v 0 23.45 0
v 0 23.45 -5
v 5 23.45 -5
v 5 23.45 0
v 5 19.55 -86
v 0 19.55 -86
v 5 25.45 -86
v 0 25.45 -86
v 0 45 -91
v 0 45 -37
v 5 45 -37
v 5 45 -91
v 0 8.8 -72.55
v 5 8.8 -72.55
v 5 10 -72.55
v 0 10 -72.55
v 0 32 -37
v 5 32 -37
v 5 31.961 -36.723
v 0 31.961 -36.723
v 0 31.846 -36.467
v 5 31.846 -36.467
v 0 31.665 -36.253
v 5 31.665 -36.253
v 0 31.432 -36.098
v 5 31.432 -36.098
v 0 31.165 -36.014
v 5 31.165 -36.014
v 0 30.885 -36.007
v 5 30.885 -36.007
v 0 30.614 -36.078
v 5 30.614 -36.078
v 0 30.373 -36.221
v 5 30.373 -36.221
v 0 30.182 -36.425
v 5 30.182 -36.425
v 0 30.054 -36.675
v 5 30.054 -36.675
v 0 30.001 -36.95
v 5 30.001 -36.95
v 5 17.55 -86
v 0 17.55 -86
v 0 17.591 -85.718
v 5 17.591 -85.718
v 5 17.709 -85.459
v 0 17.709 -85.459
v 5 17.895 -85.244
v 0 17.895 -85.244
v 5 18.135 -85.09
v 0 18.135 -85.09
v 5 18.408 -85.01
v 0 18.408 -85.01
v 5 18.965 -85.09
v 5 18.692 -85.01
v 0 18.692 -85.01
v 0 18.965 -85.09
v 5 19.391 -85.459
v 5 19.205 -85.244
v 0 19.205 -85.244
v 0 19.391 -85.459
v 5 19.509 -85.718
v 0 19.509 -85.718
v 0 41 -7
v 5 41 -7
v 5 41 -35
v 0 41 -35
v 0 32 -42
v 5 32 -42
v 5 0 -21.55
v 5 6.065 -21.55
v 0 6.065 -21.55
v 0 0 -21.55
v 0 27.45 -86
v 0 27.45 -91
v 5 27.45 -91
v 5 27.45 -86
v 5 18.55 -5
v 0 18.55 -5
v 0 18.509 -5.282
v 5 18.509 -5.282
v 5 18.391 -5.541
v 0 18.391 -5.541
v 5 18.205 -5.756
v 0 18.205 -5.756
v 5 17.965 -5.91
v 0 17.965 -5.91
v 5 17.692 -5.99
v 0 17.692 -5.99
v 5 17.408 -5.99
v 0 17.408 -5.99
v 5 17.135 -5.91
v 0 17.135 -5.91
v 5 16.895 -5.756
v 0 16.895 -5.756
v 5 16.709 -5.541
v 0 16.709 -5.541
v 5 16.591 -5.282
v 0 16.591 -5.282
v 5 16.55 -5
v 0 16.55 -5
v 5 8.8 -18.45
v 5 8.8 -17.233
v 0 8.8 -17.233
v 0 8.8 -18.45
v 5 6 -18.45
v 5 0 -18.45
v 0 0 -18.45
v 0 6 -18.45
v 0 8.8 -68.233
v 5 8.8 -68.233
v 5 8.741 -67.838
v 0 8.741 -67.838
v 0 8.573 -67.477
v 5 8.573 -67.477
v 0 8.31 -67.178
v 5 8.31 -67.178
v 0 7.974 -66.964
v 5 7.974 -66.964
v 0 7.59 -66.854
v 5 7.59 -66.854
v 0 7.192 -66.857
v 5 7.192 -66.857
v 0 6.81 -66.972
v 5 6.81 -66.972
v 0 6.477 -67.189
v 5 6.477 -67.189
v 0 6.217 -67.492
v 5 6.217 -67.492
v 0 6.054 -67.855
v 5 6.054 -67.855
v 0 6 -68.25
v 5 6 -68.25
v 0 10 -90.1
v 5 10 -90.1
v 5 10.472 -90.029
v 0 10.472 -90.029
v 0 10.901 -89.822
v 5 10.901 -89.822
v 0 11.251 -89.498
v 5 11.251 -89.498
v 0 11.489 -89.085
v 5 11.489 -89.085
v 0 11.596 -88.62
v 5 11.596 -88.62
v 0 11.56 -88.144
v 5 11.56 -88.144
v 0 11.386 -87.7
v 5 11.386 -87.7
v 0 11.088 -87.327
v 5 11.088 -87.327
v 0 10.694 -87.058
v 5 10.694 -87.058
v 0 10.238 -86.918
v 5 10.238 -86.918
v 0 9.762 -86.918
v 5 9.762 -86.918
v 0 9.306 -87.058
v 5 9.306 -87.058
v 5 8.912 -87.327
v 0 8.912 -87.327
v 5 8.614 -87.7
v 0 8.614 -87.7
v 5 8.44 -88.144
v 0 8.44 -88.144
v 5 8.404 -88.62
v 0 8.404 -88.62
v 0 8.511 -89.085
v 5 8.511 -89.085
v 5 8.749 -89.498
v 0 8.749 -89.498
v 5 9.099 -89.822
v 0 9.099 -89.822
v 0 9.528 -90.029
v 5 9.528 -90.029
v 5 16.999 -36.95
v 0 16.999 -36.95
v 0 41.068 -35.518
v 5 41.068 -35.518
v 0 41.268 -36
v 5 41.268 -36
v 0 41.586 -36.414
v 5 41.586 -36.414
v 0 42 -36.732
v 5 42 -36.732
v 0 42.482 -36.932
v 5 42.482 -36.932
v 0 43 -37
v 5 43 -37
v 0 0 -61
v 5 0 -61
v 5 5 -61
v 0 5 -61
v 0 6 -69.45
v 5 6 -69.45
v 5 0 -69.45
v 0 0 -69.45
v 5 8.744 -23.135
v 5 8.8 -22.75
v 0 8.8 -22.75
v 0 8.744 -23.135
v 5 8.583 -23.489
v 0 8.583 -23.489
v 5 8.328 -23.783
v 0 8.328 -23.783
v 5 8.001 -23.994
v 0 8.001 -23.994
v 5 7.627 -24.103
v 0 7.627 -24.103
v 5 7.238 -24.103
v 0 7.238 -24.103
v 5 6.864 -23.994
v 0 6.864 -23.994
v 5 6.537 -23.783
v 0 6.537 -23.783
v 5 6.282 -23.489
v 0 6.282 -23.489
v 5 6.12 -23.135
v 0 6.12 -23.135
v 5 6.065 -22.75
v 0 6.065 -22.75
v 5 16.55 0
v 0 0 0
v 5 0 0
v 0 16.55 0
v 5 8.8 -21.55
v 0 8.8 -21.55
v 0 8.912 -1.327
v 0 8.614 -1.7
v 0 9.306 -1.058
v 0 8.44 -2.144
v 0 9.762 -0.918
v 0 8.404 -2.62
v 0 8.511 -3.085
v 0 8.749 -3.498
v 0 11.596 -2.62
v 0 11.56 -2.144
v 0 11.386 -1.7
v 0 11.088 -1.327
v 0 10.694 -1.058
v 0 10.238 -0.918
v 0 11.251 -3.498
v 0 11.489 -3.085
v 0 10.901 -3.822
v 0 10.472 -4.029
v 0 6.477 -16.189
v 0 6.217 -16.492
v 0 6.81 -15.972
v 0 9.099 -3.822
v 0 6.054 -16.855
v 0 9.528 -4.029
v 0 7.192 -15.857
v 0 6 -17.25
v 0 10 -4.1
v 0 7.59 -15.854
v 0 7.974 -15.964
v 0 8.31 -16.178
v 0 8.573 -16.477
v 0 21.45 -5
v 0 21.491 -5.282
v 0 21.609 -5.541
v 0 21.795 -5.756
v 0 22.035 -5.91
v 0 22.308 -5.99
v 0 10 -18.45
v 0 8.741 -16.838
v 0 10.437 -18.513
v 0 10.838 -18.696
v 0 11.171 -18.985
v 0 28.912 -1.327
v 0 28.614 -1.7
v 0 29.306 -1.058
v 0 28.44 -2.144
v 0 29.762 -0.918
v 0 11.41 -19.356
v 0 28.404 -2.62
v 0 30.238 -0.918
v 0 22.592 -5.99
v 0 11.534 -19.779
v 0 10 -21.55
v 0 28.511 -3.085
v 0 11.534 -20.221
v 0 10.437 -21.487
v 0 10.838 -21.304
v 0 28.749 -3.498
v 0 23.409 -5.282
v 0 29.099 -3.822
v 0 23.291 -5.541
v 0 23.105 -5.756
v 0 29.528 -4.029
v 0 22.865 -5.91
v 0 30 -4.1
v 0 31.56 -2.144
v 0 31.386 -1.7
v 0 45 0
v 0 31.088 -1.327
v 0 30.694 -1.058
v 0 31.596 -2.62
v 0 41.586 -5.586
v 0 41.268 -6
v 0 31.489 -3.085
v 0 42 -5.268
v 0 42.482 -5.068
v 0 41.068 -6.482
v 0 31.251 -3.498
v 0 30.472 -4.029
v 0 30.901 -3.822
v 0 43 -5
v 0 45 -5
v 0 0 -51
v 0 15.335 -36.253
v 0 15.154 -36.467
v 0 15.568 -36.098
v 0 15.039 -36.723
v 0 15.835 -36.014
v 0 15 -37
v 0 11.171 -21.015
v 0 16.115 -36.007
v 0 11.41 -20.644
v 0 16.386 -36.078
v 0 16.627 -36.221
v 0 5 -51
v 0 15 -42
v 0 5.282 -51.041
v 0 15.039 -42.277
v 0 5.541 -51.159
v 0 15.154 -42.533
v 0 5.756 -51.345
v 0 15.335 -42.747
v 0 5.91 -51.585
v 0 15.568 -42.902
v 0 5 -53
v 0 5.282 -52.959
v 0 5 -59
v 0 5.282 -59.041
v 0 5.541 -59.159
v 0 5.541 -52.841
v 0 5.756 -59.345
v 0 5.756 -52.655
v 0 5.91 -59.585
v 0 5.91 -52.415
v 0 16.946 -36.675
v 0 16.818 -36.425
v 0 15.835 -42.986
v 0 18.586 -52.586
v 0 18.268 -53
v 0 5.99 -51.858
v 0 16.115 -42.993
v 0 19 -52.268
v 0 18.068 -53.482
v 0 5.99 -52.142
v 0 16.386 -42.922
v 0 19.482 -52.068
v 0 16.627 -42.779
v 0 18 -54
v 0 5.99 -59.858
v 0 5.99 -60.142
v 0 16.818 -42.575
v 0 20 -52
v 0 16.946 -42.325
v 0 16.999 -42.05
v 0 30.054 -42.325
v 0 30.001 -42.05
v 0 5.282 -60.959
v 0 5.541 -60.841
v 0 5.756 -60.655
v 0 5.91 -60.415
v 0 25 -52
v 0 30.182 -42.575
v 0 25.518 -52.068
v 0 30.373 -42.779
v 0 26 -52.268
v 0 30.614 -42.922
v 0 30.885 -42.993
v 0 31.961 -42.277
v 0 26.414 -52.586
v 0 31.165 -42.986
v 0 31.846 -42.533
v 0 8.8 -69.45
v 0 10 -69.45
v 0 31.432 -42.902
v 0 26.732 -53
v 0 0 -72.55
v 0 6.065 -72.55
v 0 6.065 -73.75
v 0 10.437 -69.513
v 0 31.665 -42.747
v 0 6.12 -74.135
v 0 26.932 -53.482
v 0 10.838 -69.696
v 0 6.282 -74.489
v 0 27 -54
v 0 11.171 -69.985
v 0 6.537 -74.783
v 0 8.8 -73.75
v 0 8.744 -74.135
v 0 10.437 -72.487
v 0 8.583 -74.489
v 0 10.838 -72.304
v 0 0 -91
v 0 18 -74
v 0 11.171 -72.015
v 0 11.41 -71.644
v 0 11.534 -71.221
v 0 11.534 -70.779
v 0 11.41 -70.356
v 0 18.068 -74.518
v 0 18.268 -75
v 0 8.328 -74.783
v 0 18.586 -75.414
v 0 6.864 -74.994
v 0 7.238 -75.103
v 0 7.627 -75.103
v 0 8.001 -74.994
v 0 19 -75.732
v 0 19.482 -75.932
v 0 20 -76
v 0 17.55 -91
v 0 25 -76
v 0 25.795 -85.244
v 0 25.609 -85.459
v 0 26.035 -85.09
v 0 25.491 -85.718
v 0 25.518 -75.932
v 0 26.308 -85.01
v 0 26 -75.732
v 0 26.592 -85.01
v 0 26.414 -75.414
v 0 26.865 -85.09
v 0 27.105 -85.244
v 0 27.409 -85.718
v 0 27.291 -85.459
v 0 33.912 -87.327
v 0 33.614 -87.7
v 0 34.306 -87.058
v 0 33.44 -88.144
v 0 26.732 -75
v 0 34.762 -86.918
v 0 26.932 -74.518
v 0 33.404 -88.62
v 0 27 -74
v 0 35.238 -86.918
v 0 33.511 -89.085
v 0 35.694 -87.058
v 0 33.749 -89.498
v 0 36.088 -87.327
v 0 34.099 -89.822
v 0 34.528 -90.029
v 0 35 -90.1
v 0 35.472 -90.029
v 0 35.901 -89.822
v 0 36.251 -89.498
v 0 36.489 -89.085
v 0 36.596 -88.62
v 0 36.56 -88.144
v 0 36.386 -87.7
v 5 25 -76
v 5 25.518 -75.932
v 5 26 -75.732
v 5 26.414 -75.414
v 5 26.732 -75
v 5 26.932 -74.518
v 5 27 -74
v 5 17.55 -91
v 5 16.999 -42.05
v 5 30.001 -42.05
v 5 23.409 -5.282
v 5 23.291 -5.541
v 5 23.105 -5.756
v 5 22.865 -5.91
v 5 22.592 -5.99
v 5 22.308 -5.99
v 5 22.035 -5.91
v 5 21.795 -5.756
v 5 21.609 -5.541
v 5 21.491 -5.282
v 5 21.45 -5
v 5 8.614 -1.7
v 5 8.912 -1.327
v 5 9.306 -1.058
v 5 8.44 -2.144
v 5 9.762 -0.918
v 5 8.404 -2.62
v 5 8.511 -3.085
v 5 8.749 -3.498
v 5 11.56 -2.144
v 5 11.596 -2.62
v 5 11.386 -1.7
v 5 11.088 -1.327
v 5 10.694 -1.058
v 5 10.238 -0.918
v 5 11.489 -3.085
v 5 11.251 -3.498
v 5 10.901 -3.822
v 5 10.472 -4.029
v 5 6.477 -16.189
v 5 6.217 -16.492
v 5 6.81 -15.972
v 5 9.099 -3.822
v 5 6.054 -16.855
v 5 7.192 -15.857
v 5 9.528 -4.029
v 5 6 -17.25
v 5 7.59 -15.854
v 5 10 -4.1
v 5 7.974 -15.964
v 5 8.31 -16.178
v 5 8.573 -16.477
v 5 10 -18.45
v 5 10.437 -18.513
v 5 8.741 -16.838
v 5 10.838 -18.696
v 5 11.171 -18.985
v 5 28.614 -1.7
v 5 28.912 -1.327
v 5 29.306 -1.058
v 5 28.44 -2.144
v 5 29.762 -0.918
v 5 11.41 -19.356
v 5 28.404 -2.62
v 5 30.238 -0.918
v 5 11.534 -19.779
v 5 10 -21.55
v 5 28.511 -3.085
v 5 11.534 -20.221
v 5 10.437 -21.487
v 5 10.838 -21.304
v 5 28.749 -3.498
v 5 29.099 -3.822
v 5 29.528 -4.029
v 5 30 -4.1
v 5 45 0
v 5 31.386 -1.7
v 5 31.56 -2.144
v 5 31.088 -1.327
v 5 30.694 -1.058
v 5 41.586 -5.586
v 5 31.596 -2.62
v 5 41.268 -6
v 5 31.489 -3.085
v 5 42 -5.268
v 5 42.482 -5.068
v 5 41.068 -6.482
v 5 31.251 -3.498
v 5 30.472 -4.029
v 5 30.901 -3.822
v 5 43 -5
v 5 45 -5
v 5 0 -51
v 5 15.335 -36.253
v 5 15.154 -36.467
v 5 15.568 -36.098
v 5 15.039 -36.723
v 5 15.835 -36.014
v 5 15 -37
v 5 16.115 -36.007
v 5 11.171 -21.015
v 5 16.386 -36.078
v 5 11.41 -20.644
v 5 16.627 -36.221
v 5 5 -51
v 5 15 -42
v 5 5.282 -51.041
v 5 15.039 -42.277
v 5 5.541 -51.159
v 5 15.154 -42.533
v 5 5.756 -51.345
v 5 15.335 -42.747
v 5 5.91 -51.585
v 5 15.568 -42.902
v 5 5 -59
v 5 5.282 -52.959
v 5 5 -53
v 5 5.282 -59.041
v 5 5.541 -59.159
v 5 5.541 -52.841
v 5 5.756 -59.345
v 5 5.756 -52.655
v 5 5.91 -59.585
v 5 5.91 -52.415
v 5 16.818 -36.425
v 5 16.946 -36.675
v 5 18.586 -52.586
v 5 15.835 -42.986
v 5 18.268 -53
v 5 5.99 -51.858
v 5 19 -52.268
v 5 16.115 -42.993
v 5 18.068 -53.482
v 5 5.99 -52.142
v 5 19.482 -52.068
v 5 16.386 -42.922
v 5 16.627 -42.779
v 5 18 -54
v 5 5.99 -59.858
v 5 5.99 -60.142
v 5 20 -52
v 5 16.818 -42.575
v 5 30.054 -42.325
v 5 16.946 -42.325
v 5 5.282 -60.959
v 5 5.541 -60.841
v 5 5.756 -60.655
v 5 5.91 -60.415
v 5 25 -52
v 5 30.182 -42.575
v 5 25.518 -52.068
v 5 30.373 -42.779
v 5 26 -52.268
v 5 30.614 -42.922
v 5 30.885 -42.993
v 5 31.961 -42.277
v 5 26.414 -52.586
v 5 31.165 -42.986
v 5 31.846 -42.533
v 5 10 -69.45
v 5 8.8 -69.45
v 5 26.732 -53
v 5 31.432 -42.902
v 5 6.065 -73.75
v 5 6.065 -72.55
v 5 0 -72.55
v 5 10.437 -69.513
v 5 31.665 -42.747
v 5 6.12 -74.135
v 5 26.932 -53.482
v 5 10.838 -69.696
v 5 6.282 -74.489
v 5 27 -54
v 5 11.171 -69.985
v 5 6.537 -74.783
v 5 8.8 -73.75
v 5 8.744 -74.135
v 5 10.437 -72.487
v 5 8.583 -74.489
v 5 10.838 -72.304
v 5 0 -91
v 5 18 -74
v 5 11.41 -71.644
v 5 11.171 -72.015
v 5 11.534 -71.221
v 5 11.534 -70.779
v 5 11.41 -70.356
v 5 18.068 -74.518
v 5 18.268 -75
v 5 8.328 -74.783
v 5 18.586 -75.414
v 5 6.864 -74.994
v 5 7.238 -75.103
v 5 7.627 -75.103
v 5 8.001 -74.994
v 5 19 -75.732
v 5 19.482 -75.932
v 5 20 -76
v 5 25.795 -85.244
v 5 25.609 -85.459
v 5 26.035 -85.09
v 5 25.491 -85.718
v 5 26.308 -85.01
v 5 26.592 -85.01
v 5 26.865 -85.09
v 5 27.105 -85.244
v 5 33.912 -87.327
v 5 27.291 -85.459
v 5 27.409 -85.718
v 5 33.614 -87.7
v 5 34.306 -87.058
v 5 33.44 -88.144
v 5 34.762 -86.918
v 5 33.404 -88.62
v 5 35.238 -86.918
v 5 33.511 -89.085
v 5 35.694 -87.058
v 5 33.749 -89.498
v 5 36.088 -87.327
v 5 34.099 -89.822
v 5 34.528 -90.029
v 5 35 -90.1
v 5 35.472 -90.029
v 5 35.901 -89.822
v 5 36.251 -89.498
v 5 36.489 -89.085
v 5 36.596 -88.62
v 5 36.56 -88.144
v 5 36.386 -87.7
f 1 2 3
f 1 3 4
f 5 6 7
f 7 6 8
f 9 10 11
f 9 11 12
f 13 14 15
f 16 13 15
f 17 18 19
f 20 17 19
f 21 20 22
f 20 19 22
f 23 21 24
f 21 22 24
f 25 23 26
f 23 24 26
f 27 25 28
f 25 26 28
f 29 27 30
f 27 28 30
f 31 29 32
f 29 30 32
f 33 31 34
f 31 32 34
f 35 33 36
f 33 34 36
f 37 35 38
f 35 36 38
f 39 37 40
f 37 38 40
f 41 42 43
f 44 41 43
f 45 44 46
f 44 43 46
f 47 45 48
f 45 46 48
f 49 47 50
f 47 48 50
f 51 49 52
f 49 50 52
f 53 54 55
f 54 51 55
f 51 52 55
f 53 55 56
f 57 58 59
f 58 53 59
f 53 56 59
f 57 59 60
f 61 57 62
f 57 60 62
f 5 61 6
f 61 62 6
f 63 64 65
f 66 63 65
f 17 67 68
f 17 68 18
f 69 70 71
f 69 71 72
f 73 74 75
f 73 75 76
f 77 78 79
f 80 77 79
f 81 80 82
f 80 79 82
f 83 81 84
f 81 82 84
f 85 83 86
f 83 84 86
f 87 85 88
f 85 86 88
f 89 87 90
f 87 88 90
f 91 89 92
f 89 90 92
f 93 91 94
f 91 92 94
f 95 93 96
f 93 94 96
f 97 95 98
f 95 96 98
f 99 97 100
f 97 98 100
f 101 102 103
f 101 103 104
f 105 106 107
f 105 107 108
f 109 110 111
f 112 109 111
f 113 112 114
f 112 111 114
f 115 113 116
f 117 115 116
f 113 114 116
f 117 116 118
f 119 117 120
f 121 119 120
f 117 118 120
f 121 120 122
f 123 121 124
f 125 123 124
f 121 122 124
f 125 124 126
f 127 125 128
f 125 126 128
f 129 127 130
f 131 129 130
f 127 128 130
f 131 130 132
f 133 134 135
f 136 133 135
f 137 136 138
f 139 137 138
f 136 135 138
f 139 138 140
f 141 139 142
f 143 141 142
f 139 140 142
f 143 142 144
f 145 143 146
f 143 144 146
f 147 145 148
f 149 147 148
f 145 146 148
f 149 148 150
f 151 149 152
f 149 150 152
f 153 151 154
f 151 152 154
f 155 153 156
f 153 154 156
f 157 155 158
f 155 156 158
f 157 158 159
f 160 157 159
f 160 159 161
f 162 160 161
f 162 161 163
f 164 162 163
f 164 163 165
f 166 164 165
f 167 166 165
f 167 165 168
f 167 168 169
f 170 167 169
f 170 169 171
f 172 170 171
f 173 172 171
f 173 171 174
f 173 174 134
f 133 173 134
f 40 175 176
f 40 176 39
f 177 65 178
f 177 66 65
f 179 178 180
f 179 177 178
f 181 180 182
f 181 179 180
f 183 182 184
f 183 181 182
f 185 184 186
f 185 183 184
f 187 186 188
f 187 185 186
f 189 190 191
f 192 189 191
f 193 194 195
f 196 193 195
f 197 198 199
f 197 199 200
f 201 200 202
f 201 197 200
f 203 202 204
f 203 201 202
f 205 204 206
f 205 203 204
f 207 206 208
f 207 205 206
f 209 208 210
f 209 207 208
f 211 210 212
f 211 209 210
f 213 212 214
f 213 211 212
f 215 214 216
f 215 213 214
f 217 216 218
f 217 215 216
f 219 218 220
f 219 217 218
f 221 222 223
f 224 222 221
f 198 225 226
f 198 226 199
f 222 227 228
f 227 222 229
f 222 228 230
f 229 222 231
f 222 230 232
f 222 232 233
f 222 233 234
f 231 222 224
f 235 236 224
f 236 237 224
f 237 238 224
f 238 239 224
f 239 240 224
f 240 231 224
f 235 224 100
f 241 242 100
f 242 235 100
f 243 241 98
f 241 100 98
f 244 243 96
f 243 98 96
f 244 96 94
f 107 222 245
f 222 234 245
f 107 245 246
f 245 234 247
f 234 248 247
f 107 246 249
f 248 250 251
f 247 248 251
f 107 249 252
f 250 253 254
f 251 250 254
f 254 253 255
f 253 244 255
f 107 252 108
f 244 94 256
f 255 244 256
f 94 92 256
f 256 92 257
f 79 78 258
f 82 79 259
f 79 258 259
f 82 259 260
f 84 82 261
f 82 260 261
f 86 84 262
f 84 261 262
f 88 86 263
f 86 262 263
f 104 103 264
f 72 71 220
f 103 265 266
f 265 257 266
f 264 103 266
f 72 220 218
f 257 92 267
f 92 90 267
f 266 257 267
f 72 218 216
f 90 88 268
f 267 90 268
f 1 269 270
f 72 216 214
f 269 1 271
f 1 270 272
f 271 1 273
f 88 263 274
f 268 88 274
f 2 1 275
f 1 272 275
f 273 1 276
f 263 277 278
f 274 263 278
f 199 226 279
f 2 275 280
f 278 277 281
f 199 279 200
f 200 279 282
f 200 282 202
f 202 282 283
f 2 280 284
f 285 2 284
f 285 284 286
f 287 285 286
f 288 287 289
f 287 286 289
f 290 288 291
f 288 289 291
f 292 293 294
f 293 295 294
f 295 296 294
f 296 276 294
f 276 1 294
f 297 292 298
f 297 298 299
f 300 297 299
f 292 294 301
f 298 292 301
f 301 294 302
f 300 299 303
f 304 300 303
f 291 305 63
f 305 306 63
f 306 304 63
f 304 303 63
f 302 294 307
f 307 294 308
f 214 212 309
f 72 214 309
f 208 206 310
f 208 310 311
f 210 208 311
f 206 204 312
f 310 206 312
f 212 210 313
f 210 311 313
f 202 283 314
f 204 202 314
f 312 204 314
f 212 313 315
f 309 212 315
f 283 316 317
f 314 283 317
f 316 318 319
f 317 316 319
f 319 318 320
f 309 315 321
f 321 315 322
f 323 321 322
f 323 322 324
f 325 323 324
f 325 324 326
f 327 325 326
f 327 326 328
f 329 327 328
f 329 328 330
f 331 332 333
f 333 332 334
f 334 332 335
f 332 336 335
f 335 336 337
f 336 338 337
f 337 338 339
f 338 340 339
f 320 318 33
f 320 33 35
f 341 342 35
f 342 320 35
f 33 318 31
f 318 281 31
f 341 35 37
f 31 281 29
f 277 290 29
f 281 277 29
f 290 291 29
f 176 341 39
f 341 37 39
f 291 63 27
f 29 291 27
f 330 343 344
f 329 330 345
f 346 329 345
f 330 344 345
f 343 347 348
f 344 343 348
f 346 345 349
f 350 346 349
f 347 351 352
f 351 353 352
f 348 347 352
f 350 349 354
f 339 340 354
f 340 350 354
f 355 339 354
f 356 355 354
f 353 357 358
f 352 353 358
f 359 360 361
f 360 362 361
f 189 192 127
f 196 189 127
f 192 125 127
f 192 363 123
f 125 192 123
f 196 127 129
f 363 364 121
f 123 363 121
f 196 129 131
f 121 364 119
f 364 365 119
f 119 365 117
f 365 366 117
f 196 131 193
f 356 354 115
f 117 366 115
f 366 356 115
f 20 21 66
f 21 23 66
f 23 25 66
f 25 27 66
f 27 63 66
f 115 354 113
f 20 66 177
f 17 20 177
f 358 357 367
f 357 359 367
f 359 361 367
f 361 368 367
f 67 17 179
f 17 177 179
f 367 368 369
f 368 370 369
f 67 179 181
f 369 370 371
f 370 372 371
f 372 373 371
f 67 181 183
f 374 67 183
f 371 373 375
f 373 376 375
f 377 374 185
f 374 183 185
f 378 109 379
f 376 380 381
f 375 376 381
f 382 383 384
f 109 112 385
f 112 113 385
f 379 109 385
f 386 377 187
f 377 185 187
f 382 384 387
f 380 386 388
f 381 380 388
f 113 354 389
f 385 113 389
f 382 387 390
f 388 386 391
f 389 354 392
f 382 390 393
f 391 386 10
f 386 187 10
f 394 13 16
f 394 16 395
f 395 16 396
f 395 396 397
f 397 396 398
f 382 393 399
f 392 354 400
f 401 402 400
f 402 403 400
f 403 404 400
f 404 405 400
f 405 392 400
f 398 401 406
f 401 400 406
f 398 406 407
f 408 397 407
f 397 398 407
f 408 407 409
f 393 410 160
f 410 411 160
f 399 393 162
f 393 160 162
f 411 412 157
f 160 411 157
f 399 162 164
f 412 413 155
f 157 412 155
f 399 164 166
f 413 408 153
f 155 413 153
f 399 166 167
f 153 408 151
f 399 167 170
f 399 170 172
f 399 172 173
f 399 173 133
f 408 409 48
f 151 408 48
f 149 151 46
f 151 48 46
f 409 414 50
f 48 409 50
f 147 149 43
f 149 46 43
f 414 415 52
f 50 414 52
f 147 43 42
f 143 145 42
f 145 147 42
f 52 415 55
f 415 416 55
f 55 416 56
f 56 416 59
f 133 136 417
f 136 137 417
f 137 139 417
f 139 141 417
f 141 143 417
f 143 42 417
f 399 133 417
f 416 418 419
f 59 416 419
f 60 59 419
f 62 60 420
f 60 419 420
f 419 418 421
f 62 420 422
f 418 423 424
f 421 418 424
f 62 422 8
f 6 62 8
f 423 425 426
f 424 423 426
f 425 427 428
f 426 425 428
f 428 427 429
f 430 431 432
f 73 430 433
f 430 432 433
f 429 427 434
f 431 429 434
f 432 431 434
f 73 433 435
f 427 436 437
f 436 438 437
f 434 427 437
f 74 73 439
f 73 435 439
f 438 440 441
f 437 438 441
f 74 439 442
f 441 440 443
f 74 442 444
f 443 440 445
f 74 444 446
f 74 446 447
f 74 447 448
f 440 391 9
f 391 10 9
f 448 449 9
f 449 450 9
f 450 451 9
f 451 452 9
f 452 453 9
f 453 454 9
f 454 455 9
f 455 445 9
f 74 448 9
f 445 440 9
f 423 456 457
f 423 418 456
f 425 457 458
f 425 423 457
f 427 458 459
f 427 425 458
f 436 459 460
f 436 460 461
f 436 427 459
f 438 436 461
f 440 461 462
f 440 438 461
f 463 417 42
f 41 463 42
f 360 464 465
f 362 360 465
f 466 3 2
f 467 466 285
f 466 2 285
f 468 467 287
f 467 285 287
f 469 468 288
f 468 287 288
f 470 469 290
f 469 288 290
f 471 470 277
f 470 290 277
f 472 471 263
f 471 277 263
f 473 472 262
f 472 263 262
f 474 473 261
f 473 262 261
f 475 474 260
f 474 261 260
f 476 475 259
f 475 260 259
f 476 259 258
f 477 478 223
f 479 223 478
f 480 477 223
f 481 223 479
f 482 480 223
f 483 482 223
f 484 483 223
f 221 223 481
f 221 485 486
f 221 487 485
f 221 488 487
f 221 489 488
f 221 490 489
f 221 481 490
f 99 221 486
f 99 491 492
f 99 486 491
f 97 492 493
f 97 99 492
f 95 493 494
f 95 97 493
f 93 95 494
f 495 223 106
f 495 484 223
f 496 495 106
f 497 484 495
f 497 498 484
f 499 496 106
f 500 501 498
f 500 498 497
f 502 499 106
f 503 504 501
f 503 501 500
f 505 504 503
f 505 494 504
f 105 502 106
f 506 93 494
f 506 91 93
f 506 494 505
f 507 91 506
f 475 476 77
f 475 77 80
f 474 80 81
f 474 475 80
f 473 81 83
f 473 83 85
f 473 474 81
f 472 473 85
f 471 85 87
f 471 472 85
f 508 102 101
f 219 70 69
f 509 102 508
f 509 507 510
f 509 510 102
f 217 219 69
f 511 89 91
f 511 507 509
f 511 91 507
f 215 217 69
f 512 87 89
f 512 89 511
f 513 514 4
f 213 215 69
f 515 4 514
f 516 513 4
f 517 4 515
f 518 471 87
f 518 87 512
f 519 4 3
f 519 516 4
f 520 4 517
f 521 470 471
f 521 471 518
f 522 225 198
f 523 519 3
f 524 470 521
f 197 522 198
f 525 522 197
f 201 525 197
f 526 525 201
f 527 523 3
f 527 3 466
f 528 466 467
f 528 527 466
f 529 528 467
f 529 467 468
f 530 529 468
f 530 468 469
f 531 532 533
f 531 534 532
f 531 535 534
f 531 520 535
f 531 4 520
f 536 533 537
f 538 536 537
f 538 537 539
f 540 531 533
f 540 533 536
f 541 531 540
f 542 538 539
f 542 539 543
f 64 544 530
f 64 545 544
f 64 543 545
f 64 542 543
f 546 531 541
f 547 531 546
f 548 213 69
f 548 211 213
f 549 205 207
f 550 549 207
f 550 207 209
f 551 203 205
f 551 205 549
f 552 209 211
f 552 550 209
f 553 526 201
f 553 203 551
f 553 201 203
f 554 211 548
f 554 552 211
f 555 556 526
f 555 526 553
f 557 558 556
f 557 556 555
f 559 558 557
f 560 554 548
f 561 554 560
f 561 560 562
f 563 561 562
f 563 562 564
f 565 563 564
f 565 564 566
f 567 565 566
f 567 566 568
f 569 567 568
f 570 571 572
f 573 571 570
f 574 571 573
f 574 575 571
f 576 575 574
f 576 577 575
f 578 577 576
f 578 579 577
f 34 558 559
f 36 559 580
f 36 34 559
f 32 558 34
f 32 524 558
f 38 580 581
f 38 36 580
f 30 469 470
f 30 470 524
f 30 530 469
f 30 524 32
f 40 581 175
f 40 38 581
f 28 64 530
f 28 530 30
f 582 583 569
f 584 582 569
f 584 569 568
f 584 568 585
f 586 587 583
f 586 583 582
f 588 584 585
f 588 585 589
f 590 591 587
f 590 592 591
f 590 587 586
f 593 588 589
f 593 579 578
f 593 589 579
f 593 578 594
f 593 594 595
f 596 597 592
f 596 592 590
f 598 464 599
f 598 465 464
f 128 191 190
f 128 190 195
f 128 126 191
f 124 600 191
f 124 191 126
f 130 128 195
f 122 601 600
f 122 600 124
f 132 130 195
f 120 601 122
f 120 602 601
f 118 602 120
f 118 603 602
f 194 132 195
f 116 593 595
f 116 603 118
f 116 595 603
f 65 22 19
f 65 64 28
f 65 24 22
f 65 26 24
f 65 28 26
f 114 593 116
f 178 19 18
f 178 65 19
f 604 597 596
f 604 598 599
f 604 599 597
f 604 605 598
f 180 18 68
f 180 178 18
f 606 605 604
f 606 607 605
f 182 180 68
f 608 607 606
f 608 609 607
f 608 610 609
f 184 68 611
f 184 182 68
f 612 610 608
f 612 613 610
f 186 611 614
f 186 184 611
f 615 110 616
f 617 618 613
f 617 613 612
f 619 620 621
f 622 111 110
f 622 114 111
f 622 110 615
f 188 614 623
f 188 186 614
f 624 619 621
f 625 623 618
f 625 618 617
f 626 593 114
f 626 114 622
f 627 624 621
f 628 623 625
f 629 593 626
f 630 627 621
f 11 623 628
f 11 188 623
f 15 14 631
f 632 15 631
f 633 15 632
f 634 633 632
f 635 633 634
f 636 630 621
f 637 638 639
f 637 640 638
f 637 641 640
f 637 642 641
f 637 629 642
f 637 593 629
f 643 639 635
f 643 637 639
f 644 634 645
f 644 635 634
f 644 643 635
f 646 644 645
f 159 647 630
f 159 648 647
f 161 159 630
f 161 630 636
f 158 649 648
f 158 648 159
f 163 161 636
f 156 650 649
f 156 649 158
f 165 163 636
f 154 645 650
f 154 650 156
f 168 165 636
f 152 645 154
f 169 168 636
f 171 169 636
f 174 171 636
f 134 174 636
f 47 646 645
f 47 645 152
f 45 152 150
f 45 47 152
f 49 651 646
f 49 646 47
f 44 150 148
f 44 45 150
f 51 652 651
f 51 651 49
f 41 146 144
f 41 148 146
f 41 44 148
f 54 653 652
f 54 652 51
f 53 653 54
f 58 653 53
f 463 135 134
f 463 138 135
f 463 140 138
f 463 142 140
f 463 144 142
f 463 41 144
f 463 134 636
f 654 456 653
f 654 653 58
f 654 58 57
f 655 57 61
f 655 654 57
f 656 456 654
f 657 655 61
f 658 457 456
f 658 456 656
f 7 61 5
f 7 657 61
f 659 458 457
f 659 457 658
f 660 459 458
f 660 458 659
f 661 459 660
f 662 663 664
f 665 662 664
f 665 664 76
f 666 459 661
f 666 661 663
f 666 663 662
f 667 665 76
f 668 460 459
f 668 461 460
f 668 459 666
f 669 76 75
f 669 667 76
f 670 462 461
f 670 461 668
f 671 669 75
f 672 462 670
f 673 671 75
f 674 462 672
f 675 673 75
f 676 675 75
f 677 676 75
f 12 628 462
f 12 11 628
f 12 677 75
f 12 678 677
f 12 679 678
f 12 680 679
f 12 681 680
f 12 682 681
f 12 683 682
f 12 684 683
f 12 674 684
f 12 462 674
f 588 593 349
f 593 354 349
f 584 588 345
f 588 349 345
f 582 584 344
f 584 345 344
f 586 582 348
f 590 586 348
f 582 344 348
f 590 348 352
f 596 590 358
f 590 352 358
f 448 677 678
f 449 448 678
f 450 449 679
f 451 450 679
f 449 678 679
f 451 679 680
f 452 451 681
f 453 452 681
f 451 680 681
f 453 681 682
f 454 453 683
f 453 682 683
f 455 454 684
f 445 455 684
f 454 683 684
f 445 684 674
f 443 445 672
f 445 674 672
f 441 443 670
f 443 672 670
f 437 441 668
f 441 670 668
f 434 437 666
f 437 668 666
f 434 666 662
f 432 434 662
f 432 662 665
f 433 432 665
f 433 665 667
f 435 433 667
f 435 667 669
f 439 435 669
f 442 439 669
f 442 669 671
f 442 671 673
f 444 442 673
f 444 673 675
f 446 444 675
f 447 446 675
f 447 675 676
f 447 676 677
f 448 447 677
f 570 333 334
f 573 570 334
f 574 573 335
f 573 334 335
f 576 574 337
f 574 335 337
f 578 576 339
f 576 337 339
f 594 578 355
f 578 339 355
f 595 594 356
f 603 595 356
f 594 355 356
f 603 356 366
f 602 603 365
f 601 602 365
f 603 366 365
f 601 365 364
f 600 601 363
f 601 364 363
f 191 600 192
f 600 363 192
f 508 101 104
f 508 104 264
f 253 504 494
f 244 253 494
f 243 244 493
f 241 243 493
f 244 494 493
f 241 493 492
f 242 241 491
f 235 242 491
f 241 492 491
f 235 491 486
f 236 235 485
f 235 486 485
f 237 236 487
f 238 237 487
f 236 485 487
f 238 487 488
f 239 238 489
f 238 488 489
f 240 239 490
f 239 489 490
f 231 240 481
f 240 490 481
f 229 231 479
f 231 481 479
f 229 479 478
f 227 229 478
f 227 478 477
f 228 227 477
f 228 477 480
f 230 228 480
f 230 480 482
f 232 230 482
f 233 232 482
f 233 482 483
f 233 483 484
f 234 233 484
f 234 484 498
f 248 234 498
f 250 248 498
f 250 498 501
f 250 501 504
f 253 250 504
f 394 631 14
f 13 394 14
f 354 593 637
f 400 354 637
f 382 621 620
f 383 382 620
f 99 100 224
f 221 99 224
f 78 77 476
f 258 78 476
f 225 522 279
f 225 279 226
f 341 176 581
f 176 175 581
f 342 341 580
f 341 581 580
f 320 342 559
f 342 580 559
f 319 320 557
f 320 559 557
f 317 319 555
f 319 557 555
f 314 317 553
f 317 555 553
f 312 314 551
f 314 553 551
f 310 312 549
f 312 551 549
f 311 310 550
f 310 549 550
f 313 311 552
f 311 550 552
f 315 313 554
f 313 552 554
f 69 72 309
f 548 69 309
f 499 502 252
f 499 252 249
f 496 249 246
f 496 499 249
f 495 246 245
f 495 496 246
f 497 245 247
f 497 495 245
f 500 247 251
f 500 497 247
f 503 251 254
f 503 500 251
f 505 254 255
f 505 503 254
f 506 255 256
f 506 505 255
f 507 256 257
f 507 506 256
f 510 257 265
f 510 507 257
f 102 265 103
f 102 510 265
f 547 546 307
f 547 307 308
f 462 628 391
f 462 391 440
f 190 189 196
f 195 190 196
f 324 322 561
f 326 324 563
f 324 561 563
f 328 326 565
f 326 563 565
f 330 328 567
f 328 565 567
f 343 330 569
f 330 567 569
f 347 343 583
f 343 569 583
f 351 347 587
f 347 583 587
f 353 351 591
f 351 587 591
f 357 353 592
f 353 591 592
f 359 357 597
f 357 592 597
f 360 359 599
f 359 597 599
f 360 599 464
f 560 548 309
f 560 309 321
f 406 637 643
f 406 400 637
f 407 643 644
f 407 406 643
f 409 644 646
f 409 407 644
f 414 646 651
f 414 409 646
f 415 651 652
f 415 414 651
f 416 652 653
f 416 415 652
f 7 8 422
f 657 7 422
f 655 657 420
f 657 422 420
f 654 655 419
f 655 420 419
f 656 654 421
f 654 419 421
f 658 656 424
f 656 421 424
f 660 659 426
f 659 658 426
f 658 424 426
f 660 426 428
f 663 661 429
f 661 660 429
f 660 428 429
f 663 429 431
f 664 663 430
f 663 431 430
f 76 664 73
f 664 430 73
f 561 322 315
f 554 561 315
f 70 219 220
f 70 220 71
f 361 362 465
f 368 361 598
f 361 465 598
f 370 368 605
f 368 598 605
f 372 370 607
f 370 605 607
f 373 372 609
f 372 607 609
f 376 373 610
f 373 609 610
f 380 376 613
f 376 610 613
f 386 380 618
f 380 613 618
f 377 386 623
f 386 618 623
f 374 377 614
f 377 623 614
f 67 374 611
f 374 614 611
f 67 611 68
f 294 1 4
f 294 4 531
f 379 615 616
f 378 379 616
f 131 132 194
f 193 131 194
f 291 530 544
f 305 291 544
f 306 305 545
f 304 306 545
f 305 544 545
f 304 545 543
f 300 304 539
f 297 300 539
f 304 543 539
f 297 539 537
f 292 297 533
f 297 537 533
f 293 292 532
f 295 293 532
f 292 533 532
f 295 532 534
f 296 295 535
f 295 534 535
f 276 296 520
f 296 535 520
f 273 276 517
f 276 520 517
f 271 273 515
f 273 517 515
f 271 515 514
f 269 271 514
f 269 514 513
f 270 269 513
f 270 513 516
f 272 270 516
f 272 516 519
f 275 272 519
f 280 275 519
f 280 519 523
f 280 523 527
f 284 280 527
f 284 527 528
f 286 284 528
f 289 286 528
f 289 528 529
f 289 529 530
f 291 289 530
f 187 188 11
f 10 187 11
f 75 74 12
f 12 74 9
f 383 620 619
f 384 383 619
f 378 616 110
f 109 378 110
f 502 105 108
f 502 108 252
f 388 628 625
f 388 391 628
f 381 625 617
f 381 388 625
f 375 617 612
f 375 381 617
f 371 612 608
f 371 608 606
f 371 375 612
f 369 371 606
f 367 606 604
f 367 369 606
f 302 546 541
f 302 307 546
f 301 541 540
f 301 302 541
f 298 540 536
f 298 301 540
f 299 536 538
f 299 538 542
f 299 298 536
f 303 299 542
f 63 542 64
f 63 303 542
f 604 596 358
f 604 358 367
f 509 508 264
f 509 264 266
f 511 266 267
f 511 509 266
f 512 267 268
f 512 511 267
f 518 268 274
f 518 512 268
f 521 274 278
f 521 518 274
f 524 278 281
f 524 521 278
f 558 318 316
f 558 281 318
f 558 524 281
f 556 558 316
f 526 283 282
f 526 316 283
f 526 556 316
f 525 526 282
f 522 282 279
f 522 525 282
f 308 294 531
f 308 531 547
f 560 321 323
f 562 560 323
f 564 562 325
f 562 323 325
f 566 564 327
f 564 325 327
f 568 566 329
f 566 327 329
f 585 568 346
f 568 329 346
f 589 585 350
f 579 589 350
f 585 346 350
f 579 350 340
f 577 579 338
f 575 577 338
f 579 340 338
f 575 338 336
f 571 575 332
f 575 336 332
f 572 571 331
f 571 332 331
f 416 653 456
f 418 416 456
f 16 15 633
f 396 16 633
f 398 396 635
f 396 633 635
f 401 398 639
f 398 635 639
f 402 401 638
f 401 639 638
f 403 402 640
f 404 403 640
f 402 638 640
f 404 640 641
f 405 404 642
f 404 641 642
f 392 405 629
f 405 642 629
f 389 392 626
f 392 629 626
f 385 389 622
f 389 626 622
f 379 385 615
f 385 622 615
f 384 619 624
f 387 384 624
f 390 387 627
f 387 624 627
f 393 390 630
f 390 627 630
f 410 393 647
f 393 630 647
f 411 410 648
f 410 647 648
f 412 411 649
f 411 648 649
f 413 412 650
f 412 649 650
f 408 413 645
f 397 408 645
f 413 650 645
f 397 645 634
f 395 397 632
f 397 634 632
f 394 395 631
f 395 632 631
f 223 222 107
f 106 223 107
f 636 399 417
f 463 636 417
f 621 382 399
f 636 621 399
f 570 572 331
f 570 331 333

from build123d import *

# Parameters (mm, degrees)
SKETCH_1_W           = 91
SKETCH_1_H           = 45
EXTRUDE_1_DEPTH      = 5
SKETCH_7_W           = 24
SKETCH_7_H           = 9
CUT_EXTRUDE_3_DEPTH  = 10
FILLET_1_R           = 2
SKETCH_8_W           = 32
SKETCH_8_H           = 4
CUT_EXTRUDE_4_DEPTH  = 10
FILLET_2_R           = 2
SKETCH_9_W           = 5
SKETCH_9_H           = 17
CUT_EXTRUDE_5_DEPTH  = 5
SKETCH_14_R          = 1.55
SKETCH_14_R_2        = 1.482519405
CUT_EXTRUDE_9_DEPTH  = 10
SKETCH_10_R          = 1
CUT_EXTRUDE_6_DEPTH  = 10
SKETCH_12_R          = 1.6
CUT_EXTRUDE_7_DEPTH  = 10
CUT_EXTRUDE_8_DEPTH  = 10
SKETCH_15_W          = 10
SKETCH_15_H          = 5
CUT_EXTRUDE_10_DEPTH = 10
SKETCH_19_W          = 5
SKETCH_19_H          = 6.9
SKETCH_19_H_2        = 9.9
CUT_EXTRUDE_14_DEPTH = 5
SKETCH_16_R          = 1
CUT_EXTRUDE_11_DEPTH = 10
SKETCH_20_W          = 5.1
SKETCH_20_H          = 15.197667804
CUT_EXTRUDE_15_DEPTH = 10


with BuildPart() as part:
    # 스케치1 → 보스-돌출1 (new body)
    with BuildSketch(Plane(origin=(0, 0, 0), x_dir=(0, 0, -1), z_dir=(1, 0, 0))):
        with Locations((45.5, 22.5)):
            Rectangle(SKETCH_1_W, SKETCH_1_H)
    extrude(amount=EXTRUDE_1_DEPTH)

    # 스케치7 → 컷-돌출3 (cut)
    with BuildSketch(Plane(origin=(5, 0, 0), x_dir=(0, 0, -1), z_dir=(1, 0, 0))):
        with Locations((64, 22.5)):
            Rectangle(SKETCH_7_W, SKETCH_7_H)
    extrude(amount=-CUT_EXTRUDE_3_DEPTH, mode=Mode.SUBTRACT)

    # 필렛1
    fillet_1_edges = [part.edges().sort_by_distance(p)[0] for p in [
        (2.5, 18, -52),
        (2.5, 27, -52),
        (2.5, 27, -76),
        (2.5, 18, -76),
    ]]
    fillet(fillet_1_edges, radius=FILLET_1_R)

    # 스케치8 → 컷-돌출4 (cut)
    with BuildSketch(Plane(origin=(5, 0, 0), x_dir=(0, 0, -1), z_dir=(1, 0, 0))):
        with Locations((21, 43)):
            Rectangle(SKETCH_8_W, SKETCH_8_H)
    extrude(amount=-CUT_EXTRUDE_4_DEPTH, mode=Mode.SUBTRACT)

    # 필렛2
    fillet_2_edges = [part.edges().sort_by_distance(p)[0] for p in [
        (2.5, 41, -5),
        (2.5, 41, -37),
    ]]
    fillet(fillet_2_edges, radius=FILLET_2_R)

    # 스케치9 → 컷-돌출5 (cut)
    with BuildSketch(Plane.ZY):
        with Locations((-39.5, 23.5)):
            Rectangle(SKETCH_9_W, SKETCH_9_H)
    extrude(amount=-CUT_EXTRUDE_5_DEPTH, mode=Mode.SUBTRACT)

    # 스케치14 → 컷-돌출9 (cut)
    with BuildSketch(Plane(origin=(5, 0, 0), x_dir=(0, 0, -1), z_dir=(1, 0, 0))):
        with Locations((2.5, 10)):
            Circle(SKETCH_14_R)
        with Locations((2.5, 30)):
            Circle(SKETCH_14_R)
        with Locations((88.5, 35.067480595)):
            Circle(SKETCH_14_R_2)
        with Locations((88.5, 10)):
            Circle(SKETCH_14_R)
    extrude(amount=-CUT_EXTRUDE_9_DEPTH, mode=Mode.SUBTRACT)

    # 스케치10 → 컷-돌출6 (cut)
    with BuildSketch(Plane(origin=(5, 0, 0), x_dir=(0, 0, -1), z_dir=(1, 0, 0))):
        with Locations((42, 31)):
            Circle(SKETCH_10_R)
        with Locations((42, 16)):
            Circle(SKETCH_10_R)
        with Locations((37, 16)):
            Circle(SKETCH_10_R)
        with Locations((37, 31)):
            Circle(SKETCH_10_R)
    extrude(amount=-CUT_EXTRUDE_6_DEPTH, mode=Mode.SUBTRACT)

    # 스케치12 → 컷-돌출7 (cut)
    with BuildSketch(Plane(origin=(5, 0, 0), x_dir=(0, 0, -1), z_dir=(1, 0, 0))):
        with Locations((2.5, 30)):
            Circle(SKETCH_12_R)
        with Locations((2.5, 10)):
            Circle(SKETCH_12_R)
        with Locations((88.5, 35)):
            Circle(SKETCH_12_R)
        with Locations((88.5, 10)):
            Circle(SKETCH_12_R)
    extrude(amount=-CUT_EXTRUDE_7_DEPTH, mode=Mode.SUBTRACT)

    # 스케치13 → 컷-돌출8 (cut)
    with BuildSketch(Plane(origin=(5, 0, 0), x_dir=(0, 0, -1), z_dir=(1, 0, 0))):
        with BuildLine():
            Line((18.45, 0), (18.45, 6))
            Line((18.45, 6), (17.250192706, 6))
            ThreePointArc((17.250192706, 6), (15.841386702, 7.391138254), (17.232524956, 8.799944258))
            Line((17.232524956, 8.799944258), (18.45, 8.799944258))
            Line((18.45, 8.799944258), (18.45, 10))
            ThreePointArc((18.45, 10), (20, 11.55), (21.55, 10))
            Line((21.55, 10), (21.55, 8.799872773))
            Line((21.55, 8.799872773), (22.749807294, 8.799872773))
            ThreePointArc((22.749807294, 8.799872773), (24.117188413, 7.432491654), (22.749807294, 6.065110535))
            Line((22.749807294, 6.065110535), (21.55, 6.065110535))
            Line((21.55, 6.065110535), (21.55, 0))
            Line((21.55, 0), (18.45, 0))
        make_face()
        with BuildLine():
            Line((72.55, 0), (72.55, 6.065110535))
            Line((72.55, 6.065110535), (73.749807294, 6.065110535))
            ThreePointArc((73.749807294, 6.065110535), (75.117188413, 7.432491654), (73.749807294, 8.799872773))
            Line((73.749807294, 8.799872773), (72.55, 8.799872773))
            Line((72.55, 8.799872773), (72.55, 10))
            ThreePointArc((72.55, 10), (71, 11.55), (69.45, 10))
            Line((69.45, 10), (69.45, 8.799944258))
            Line((69.45, 8.799944258), (68.232524956, 8.799944258))
            ThreePointArc((68.232524956, 8.799944258), (66.841386702, 7.391138254), (68.250192706, 6))
            Line((68.250192706, 6), (69.45, 6))
            Line((69.45, 6), (69.45, 0))
            Line((69.45, 0), (72.55, 0))
        make_face()
    extrude(amount=-CUT_EXTRUDE_8_DEPTH, mode=Mode.SUBTRACT)

    # 스케치15 → 컷-돌출10 (cut)
    with BuildSketch(Plane(origin=(5, 0, 0), x_dir=(0, 0, -1), z_dir=(1, 0, 0))):
        with Locations((56, 2.5)):
            Rectangle(SKETCH_15_W, SKETCH_15_H)
    extrude(amount=-CUT_EXTRUDE_10_DEPTH, mode=Mode.SUBTRACT)

    # 스케치19 → 컷-돌출14 (cut)
    with BuildSketch(Plane.ZY):
        with Locations((-2.5, 20)):
            Rectangle(SKETCH_19_W, SKETCH_19_H)
        with Locations((-88.5, 22.5)):
            Rectangle(SKETCH_19_W, SKETCH_19_H_2)
    extrude(amount=-CUT_EXTRUDE_14_DEPTH, mode=Mode.SUBTRACT)

    # 스케치16 → 컷-돌출11 (cut)
    with BuildSketch(Plane.ZY):
        with Locations((-60, 5)):
            Circle(SKETCH_16_R)
        with Locations((-52, 5)):
            Circle(SKETCH_16_R)
        with Locations((-86, 26.45)):
            Circle(SKETCH_16_R)
        with Locations((-86, 18.55)):
            Circle(SKETCH_16_R)
        with Locations((-5, 22.45)):
            Circle(SKETCH_16_R)
        with Locations((-5, 17.55)):
            Circle(SKETCH_16_R)
    extrude(amount=-CUT_EXTRUDE_11_DEPTH, mode=Mode.SUBTRACT)

    # 스케치20 → 컷-돌출15 (cut)
    with BuildSketch(Plane(origin=(5, 0, 0), x_dir=(0, 0, -1), z_dir=(1, 0, 0))):
        with Locations((39.5, 23.598833902)):
            Rectangle(SKETCH_20_W, SKETCH_20_H)
    extrude(amount=-CUT_EXTRUDE_15_DEPTH, mode=Mode.SUBTRACT)


solid = part.part
